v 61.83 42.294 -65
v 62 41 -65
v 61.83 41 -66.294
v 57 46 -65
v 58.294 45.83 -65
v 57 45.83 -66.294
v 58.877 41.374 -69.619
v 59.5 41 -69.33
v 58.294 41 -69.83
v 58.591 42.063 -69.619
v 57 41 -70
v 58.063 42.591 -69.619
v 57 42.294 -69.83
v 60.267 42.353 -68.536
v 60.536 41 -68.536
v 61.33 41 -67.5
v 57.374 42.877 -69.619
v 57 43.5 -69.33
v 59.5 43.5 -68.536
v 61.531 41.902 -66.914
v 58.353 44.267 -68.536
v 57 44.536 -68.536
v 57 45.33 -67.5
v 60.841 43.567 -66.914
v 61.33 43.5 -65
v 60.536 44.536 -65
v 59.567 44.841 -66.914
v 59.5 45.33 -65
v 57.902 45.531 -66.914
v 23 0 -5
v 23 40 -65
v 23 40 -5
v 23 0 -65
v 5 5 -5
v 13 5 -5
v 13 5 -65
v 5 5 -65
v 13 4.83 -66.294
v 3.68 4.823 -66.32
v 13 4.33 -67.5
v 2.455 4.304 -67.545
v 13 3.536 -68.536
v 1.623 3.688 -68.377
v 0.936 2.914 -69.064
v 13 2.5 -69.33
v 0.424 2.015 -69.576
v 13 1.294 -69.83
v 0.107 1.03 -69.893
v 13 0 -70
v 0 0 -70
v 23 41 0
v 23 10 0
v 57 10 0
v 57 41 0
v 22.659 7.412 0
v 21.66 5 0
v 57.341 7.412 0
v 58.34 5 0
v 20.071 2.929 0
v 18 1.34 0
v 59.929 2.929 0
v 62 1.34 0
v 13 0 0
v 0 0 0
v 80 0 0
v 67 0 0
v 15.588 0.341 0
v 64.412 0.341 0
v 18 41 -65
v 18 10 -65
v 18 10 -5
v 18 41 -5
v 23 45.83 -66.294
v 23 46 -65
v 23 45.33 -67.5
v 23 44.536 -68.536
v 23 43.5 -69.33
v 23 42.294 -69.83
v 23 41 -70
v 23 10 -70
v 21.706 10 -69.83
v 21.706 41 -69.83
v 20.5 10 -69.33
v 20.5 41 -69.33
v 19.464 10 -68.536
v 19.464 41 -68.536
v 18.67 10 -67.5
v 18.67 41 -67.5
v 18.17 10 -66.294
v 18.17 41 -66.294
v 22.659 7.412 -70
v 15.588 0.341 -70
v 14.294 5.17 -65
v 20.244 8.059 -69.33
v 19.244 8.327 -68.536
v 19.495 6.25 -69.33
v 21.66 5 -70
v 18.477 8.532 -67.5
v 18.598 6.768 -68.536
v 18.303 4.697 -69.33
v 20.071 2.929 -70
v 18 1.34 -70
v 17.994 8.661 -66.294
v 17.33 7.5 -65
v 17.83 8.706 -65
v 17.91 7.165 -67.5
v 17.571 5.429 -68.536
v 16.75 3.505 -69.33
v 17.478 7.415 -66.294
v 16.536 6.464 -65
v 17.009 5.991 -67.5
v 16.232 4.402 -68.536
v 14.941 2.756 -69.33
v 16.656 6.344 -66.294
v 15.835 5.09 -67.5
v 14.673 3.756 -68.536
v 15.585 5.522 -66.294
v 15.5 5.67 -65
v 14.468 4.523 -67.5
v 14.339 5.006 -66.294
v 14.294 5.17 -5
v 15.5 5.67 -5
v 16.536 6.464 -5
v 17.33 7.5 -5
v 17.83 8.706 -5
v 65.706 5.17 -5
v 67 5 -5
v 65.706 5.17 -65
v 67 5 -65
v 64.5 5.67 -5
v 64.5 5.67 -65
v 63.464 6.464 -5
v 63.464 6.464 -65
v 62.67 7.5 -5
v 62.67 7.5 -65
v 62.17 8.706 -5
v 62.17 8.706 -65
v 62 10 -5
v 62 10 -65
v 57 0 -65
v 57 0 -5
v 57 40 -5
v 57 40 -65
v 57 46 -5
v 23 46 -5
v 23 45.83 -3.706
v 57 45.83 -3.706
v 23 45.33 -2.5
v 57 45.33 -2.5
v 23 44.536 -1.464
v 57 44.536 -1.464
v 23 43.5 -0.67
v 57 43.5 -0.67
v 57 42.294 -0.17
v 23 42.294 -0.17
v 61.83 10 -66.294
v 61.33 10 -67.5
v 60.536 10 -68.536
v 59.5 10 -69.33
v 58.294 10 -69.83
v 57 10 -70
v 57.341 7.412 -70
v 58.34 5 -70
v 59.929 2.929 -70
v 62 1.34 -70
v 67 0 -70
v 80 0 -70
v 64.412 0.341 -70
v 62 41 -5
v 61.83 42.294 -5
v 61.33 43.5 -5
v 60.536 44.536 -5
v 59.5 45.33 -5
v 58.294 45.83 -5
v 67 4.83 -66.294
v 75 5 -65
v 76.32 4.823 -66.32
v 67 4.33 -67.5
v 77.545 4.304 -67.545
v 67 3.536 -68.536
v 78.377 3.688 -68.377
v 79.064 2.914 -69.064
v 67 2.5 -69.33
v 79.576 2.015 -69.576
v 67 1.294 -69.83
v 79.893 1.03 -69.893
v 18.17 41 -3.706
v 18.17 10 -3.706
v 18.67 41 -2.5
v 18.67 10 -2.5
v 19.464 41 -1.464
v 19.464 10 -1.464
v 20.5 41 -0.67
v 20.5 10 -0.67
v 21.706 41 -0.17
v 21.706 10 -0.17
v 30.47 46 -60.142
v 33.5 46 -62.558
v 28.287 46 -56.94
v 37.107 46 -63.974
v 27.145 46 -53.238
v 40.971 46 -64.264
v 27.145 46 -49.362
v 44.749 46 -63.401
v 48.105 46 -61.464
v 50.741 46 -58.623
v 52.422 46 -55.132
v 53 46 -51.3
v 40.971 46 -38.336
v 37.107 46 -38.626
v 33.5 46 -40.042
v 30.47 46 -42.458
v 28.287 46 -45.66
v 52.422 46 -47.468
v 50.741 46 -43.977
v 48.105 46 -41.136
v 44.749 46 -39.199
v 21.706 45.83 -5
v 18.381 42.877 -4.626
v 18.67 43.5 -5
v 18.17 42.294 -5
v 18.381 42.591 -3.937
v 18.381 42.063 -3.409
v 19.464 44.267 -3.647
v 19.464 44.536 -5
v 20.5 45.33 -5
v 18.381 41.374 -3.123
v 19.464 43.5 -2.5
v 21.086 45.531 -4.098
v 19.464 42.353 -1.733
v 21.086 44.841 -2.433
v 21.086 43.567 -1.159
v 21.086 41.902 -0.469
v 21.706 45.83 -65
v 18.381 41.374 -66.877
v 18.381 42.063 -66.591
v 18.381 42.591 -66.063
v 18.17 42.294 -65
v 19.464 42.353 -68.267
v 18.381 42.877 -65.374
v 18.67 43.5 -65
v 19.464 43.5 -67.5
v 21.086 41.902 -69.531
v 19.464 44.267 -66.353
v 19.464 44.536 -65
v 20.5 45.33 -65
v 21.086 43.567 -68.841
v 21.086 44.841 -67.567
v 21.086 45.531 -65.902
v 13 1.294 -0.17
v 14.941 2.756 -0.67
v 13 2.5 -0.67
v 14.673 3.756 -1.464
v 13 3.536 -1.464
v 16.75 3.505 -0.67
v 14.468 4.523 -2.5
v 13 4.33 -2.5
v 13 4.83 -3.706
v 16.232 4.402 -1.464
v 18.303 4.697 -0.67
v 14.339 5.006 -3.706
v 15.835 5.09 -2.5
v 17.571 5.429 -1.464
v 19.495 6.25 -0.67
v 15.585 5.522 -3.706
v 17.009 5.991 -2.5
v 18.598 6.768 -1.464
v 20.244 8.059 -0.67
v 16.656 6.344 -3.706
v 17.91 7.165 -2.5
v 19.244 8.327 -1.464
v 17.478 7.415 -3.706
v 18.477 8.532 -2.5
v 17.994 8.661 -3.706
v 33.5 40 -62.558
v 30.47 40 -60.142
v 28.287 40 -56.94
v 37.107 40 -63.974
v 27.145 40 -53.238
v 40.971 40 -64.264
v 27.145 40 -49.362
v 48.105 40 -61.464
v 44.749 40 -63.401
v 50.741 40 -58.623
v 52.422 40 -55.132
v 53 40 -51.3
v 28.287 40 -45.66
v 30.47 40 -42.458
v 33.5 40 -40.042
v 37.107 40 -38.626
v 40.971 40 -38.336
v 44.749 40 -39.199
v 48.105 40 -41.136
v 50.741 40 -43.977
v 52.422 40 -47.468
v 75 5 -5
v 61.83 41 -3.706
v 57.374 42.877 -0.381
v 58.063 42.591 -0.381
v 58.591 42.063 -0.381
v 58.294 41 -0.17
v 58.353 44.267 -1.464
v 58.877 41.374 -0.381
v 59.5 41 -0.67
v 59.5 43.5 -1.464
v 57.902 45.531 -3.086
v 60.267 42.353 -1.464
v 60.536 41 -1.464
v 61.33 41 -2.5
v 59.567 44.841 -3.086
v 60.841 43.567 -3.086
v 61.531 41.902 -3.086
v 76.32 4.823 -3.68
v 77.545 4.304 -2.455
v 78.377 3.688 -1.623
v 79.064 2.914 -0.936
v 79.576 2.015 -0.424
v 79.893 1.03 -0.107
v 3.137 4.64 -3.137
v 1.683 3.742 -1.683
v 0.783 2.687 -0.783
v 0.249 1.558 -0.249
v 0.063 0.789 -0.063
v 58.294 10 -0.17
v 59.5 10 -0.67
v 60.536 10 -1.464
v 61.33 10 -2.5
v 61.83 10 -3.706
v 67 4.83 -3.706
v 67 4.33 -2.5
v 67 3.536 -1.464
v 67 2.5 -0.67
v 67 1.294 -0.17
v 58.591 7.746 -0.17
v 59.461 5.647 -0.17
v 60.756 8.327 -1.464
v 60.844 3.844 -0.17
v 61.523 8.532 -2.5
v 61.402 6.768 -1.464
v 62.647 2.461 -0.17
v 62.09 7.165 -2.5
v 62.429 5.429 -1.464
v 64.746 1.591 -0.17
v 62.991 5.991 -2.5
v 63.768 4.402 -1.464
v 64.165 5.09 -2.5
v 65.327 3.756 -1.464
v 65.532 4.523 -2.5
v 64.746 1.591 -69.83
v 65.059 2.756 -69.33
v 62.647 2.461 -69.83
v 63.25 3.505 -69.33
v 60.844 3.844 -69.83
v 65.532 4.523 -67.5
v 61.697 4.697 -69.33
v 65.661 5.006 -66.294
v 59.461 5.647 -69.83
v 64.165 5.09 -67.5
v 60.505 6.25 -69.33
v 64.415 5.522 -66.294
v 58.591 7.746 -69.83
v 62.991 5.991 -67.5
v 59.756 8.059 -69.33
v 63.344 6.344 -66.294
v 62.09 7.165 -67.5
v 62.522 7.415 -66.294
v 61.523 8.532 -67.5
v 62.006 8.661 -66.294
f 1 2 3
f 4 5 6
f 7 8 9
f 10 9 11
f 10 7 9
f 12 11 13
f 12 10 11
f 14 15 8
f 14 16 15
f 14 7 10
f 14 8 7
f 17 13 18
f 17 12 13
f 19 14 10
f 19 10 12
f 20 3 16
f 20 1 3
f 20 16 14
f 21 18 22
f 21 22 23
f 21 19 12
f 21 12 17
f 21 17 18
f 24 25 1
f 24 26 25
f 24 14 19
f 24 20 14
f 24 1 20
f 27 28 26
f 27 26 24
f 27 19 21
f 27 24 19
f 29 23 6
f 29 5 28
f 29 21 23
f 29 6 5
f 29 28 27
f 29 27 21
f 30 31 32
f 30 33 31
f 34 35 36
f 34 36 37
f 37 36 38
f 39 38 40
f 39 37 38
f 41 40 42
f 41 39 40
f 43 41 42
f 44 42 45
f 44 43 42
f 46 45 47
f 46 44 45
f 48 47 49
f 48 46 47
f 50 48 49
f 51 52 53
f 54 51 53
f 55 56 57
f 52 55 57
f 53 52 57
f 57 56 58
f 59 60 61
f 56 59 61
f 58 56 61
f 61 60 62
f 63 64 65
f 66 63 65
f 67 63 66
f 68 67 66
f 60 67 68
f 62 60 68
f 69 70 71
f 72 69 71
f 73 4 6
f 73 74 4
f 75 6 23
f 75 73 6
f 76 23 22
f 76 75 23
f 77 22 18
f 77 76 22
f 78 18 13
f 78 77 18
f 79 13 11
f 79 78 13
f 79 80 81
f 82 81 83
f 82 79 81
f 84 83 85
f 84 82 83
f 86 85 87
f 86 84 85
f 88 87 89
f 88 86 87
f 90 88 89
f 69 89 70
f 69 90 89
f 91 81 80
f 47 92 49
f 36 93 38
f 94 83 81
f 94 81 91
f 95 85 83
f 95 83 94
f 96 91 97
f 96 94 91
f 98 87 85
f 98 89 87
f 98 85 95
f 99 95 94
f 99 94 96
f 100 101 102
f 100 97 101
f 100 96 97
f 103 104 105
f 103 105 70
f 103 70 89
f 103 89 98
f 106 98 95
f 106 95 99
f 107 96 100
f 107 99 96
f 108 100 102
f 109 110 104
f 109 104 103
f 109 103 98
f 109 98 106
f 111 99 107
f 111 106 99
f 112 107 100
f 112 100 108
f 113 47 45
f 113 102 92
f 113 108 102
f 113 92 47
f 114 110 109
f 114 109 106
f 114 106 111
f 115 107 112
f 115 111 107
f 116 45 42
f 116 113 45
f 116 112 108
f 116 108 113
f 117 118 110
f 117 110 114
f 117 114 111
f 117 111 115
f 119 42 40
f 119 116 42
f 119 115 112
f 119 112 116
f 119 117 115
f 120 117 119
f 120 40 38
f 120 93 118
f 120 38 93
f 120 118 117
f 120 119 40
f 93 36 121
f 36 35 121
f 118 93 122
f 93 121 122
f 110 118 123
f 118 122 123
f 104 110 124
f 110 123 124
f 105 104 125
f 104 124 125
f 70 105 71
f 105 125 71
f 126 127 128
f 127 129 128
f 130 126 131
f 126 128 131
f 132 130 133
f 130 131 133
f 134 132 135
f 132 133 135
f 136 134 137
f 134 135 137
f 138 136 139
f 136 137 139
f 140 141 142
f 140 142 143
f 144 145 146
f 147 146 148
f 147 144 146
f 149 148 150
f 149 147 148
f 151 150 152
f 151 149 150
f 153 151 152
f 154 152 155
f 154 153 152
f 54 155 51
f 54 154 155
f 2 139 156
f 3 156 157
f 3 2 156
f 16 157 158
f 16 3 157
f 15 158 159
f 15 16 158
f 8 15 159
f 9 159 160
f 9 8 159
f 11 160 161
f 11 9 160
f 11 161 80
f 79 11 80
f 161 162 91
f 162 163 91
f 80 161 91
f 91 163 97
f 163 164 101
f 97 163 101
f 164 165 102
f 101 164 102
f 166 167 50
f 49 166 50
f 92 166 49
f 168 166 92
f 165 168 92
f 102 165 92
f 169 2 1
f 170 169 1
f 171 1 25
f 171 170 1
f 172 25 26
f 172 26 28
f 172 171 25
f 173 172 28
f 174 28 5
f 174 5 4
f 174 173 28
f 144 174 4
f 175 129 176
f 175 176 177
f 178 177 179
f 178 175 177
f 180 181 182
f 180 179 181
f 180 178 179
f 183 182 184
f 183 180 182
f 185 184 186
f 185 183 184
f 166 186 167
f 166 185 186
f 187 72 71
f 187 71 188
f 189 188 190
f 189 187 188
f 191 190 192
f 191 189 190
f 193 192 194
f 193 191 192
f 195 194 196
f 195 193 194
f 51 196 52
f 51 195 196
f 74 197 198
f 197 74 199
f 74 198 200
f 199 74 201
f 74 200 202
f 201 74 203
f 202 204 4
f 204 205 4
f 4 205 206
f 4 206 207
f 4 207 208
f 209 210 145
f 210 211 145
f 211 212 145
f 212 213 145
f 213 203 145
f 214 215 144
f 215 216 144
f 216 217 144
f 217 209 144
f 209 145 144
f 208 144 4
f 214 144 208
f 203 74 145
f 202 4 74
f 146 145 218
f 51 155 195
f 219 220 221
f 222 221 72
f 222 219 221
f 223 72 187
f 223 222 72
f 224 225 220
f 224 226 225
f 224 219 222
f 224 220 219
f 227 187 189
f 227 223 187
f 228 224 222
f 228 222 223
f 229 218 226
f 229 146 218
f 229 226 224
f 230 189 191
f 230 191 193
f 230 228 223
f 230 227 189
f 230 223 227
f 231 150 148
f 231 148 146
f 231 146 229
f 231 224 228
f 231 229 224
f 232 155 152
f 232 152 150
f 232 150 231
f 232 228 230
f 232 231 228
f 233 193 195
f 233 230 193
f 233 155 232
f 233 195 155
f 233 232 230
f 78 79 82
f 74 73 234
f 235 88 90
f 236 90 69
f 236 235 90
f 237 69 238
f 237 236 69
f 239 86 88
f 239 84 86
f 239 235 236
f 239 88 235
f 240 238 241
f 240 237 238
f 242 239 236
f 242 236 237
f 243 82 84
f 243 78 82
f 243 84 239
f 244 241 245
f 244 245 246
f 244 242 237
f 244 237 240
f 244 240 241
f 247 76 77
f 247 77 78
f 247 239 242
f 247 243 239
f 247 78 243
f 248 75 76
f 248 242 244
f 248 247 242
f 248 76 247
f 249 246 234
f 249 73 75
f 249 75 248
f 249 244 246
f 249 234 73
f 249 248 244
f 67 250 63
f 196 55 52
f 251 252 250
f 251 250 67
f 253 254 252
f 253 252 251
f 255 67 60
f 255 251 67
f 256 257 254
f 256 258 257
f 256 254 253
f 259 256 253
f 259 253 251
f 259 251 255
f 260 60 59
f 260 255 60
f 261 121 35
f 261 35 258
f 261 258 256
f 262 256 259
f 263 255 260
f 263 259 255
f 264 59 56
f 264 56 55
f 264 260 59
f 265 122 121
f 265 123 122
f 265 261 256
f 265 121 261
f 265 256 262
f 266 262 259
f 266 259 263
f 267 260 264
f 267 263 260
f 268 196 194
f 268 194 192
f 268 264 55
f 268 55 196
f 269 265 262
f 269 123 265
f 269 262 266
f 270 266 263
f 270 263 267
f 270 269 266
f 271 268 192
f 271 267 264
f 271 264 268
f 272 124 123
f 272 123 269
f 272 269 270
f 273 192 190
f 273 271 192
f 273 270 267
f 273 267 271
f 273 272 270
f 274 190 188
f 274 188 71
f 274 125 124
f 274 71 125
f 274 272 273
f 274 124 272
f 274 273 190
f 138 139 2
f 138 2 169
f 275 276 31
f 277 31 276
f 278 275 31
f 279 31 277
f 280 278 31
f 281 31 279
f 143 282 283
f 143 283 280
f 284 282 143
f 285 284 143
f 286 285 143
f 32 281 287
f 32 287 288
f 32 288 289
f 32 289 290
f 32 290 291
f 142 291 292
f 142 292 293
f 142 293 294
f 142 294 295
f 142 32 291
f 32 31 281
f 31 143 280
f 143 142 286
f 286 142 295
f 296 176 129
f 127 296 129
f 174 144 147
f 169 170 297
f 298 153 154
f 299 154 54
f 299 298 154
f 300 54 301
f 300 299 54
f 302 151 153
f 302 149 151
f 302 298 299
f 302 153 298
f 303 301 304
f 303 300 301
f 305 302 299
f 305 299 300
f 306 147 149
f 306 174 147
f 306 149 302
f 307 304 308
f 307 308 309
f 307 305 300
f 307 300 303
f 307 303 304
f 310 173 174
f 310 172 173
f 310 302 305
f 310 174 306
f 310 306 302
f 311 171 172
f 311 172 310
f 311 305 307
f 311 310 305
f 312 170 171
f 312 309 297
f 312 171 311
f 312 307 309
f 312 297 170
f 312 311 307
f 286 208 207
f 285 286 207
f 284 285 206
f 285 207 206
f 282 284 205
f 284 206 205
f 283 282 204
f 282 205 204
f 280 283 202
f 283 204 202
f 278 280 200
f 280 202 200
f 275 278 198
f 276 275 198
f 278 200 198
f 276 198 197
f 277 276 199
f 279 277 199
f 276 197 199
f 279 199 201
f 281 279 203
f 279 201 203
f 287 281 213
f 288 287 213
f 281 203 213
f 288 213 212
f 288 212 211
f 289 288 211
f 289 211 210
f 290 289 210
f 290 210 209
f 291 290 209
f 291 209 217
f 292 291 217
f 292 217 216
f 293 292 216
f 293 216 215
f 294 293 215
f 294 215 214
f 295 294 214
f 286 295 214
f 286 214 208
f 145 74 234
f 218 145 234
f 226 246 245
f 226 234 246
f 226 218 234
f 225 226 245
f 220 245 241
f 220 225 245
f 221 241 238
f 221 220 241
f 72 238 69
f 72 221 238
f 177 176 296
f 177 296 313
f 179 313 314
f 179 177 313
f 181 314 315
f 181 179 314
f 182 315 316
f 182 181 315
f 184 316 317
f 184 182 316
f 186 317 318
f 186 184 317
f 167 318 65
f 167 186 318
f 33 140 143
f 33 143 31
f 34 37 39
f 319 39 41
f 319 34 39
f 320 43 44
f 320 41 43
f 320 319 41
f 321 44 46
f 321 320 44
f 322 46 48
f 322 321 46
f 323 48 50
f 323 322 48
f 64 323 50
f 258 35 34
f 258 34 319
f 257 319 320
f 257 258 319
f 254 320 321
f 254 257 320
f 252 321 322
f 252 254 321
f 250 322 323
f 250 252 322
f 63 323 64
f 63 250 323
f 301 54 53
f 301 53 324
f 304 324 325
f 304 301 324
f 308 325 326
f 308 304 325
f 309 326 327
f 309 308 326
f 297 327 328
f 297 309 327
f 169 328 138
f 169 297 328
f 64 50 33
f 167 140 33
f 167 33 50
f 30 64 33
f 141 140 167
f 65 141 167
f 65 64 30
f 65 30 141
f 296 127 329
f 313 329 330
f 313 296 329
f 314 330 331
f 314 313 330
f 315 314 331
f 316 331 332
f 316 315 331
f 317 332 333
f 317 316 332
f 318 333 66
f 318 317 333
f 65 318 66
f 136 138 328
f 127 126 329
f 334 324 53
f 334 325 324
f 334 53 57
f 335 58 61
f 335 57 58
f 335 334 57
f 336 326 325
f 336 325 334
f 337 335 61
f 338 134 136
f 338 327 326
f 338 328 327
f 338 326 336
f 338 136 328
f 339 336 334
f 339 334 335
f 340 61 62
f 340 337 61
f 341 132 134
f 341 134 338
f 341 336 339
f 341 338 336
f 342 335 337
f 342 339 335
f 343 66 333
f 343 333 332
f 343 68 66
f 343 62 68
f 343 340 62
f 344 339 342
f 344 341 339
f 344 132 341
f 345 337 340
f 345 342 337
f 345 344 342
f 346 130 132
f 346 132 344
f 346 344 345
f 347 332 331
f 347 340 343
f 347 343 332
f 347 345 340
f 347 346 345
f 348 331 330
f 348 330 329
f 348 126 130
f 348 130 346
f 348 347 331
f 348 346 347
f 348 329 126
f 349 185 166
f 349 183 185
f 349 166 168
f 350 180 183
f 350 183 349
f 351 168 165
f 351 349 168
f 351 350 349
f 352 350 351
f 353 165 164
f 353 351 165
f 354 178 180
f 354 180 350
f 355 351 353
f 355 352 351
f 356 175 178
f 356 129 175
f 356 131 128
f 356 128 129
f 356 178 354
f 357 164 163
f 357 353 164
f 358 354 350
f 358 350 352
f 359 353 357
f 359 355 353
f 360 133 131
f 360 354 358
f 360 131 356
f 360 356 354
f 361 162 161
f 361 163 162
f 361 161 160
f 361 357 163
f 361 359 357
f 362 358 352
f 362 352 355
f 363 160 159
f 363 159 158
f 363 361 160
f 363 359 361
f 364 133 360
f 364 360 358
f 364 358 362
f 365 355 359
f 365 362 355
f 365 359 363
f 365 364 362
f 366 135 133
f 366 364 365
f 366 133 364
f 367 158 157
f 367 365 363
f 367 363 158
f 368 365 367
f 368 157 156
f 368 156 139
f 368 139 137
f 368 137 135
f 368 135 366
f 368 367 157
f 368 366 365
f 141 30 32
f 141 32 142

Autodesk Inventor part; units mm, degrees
ref_plane "YZ Plane" through (0, 0, 0) normal (1, 0, 0) x (0, 1, 0)
ref_plane "XZ Plane" through (0, 0, 0) normal (0, 1, 0) x (-1, 0, 0)
ref_plane "XY Plane" through (0, 0, 0) normal (0, 0, 1) x (1, 0, 0)
sketch "Esboço8" plane through (0, 0, 0) normal (0, 1, 0) x (-1, 0, 0)
  line L0 (0, 0) -> (-80, 0)
  line L1 (-80, 0) -> (-80, -70)
  line L2 (-80, -70) -> (0, -70)
  line L3 (0, -70) -> (0, 0)
  line L4 (0, 0) -> (-18, 0)
  line L5 (-80, -70) -> (-62, -70)
  line L6 (-18, 0) -> (-62, 0)
  line L7 (-62, 0) -> (-62, -70)
  line L8 (-62, -70) -> (-18, -70)
  line L9 (-18, -70) -> (-18, 0)
  dimension "d19" = 80
  dimension "d20" = 70
  dimension "d21" = 18
  dimension "d22" = 18
extrude "Extrusão6" add sketch "Esboço8" along normal blind 5 contours L3 L2 L9 L0 | L7 L2 L1 L0
sketch "Esboço9" plane through (0, 0, 0) normal (0, -1, 0) x (1, 0, 0)
  line L0 (0, 0) -> (18, 0) projected
  line L1 (62, -70) -> (62, 0) projected
  line L2 (18, 0) -> (62, 0)
  line L3 (62, 0) -> (62, -70)
  line L4 (62, -70) -> (18, -70)
  line L5 (18, -70) -> (18, 0)
extrude "Extrusão7" add sketch "Esboço9" against normal blind 46
sketch "Esboço10" plane through (0, 0, 0) normal (0, -1, 0) x (1, 0, 0)
  line L0 (18, 0) -> (62, 0) projected
  line L1 (62, -70) -> (62, 0) projected
  line L2 (18, 0) -> (62, 0)
  line L3 (62, 0) -> (62, -70)
  line L4 (62, -70) -> (18, -70)
  line L5 (18, -70) -> (18, 0)
  line L6 (0, 0) -> (18, 0) projected
  line L7 (18, 0) -> (23, 0)
  line L8 (23, 0) -> (23, -5)
  line L9 (23, -5) -> (18, -5)
  line L10 (18, -5) -> (18, 0)
  line L11 (62, -70) -> (57, -70)
  line L12 (57, -70) -> (57, -65)
  line L13 (57, -65) -> (62, -65)
  line L14 (62, -65) -> (62, -70)
  line L15 (23, -5) -> (57, -5)
  line L16 (57, -5) -> (57, -65)
  line L17 (57, -65) -> (23, -65)
  line L18 (23, -65) -> (23, -5)
  dimension "d27" = 5
  dimension "d28" = 5
  dimension "d29" = 5
  dimension "d30" = 5
extrude "Extrusão8" cut sketch "Esboço10" against normal blind 40 contours L15 L16 L17 L18
fillet "Arredondamento1" radius 5 16 edges at (62, 46, -35) (40, 46, 0) (18, 25.5, 0) (62, 25.5, 0) (62, 5, -35) (62, 25.5, -70) (80, 5, -35) (40, 46, -70) (18, 46, -35) (18, 25.5, -70) (18, 5, -35) (9, 5, -70) (9, 5, 0) (0, 5, -35) (71, 5, -70) (71, 5, 0)
sketch "Esboço11" plane through (0, 46, 0) normal (0, 1, 0) x (1, 0, 0)
  line L0 (23, 65) -> (23, 5) projected
  line L1 (57, 5) -> (57, 65) projected
  line L2 (23, 5) -> (57, 5)
  line L3 (57, 5) -> (57, 65)
  line L4 (57, 65) -> (23, 65)
  line L5 (23, 65) -> (23, 5)
  line L6 (40, 65) -> (40, 51.3)
  circle A0 centre (40, 51.3) radius 13
  point P0 (0, 0)
  dimension "d34" = 13.7
  dimension "d35" = 26
extrude "Extrusão9" cut sketch "Esboço11" against normal blind 10 contours A0
properties part number "case_motor_inferior"
